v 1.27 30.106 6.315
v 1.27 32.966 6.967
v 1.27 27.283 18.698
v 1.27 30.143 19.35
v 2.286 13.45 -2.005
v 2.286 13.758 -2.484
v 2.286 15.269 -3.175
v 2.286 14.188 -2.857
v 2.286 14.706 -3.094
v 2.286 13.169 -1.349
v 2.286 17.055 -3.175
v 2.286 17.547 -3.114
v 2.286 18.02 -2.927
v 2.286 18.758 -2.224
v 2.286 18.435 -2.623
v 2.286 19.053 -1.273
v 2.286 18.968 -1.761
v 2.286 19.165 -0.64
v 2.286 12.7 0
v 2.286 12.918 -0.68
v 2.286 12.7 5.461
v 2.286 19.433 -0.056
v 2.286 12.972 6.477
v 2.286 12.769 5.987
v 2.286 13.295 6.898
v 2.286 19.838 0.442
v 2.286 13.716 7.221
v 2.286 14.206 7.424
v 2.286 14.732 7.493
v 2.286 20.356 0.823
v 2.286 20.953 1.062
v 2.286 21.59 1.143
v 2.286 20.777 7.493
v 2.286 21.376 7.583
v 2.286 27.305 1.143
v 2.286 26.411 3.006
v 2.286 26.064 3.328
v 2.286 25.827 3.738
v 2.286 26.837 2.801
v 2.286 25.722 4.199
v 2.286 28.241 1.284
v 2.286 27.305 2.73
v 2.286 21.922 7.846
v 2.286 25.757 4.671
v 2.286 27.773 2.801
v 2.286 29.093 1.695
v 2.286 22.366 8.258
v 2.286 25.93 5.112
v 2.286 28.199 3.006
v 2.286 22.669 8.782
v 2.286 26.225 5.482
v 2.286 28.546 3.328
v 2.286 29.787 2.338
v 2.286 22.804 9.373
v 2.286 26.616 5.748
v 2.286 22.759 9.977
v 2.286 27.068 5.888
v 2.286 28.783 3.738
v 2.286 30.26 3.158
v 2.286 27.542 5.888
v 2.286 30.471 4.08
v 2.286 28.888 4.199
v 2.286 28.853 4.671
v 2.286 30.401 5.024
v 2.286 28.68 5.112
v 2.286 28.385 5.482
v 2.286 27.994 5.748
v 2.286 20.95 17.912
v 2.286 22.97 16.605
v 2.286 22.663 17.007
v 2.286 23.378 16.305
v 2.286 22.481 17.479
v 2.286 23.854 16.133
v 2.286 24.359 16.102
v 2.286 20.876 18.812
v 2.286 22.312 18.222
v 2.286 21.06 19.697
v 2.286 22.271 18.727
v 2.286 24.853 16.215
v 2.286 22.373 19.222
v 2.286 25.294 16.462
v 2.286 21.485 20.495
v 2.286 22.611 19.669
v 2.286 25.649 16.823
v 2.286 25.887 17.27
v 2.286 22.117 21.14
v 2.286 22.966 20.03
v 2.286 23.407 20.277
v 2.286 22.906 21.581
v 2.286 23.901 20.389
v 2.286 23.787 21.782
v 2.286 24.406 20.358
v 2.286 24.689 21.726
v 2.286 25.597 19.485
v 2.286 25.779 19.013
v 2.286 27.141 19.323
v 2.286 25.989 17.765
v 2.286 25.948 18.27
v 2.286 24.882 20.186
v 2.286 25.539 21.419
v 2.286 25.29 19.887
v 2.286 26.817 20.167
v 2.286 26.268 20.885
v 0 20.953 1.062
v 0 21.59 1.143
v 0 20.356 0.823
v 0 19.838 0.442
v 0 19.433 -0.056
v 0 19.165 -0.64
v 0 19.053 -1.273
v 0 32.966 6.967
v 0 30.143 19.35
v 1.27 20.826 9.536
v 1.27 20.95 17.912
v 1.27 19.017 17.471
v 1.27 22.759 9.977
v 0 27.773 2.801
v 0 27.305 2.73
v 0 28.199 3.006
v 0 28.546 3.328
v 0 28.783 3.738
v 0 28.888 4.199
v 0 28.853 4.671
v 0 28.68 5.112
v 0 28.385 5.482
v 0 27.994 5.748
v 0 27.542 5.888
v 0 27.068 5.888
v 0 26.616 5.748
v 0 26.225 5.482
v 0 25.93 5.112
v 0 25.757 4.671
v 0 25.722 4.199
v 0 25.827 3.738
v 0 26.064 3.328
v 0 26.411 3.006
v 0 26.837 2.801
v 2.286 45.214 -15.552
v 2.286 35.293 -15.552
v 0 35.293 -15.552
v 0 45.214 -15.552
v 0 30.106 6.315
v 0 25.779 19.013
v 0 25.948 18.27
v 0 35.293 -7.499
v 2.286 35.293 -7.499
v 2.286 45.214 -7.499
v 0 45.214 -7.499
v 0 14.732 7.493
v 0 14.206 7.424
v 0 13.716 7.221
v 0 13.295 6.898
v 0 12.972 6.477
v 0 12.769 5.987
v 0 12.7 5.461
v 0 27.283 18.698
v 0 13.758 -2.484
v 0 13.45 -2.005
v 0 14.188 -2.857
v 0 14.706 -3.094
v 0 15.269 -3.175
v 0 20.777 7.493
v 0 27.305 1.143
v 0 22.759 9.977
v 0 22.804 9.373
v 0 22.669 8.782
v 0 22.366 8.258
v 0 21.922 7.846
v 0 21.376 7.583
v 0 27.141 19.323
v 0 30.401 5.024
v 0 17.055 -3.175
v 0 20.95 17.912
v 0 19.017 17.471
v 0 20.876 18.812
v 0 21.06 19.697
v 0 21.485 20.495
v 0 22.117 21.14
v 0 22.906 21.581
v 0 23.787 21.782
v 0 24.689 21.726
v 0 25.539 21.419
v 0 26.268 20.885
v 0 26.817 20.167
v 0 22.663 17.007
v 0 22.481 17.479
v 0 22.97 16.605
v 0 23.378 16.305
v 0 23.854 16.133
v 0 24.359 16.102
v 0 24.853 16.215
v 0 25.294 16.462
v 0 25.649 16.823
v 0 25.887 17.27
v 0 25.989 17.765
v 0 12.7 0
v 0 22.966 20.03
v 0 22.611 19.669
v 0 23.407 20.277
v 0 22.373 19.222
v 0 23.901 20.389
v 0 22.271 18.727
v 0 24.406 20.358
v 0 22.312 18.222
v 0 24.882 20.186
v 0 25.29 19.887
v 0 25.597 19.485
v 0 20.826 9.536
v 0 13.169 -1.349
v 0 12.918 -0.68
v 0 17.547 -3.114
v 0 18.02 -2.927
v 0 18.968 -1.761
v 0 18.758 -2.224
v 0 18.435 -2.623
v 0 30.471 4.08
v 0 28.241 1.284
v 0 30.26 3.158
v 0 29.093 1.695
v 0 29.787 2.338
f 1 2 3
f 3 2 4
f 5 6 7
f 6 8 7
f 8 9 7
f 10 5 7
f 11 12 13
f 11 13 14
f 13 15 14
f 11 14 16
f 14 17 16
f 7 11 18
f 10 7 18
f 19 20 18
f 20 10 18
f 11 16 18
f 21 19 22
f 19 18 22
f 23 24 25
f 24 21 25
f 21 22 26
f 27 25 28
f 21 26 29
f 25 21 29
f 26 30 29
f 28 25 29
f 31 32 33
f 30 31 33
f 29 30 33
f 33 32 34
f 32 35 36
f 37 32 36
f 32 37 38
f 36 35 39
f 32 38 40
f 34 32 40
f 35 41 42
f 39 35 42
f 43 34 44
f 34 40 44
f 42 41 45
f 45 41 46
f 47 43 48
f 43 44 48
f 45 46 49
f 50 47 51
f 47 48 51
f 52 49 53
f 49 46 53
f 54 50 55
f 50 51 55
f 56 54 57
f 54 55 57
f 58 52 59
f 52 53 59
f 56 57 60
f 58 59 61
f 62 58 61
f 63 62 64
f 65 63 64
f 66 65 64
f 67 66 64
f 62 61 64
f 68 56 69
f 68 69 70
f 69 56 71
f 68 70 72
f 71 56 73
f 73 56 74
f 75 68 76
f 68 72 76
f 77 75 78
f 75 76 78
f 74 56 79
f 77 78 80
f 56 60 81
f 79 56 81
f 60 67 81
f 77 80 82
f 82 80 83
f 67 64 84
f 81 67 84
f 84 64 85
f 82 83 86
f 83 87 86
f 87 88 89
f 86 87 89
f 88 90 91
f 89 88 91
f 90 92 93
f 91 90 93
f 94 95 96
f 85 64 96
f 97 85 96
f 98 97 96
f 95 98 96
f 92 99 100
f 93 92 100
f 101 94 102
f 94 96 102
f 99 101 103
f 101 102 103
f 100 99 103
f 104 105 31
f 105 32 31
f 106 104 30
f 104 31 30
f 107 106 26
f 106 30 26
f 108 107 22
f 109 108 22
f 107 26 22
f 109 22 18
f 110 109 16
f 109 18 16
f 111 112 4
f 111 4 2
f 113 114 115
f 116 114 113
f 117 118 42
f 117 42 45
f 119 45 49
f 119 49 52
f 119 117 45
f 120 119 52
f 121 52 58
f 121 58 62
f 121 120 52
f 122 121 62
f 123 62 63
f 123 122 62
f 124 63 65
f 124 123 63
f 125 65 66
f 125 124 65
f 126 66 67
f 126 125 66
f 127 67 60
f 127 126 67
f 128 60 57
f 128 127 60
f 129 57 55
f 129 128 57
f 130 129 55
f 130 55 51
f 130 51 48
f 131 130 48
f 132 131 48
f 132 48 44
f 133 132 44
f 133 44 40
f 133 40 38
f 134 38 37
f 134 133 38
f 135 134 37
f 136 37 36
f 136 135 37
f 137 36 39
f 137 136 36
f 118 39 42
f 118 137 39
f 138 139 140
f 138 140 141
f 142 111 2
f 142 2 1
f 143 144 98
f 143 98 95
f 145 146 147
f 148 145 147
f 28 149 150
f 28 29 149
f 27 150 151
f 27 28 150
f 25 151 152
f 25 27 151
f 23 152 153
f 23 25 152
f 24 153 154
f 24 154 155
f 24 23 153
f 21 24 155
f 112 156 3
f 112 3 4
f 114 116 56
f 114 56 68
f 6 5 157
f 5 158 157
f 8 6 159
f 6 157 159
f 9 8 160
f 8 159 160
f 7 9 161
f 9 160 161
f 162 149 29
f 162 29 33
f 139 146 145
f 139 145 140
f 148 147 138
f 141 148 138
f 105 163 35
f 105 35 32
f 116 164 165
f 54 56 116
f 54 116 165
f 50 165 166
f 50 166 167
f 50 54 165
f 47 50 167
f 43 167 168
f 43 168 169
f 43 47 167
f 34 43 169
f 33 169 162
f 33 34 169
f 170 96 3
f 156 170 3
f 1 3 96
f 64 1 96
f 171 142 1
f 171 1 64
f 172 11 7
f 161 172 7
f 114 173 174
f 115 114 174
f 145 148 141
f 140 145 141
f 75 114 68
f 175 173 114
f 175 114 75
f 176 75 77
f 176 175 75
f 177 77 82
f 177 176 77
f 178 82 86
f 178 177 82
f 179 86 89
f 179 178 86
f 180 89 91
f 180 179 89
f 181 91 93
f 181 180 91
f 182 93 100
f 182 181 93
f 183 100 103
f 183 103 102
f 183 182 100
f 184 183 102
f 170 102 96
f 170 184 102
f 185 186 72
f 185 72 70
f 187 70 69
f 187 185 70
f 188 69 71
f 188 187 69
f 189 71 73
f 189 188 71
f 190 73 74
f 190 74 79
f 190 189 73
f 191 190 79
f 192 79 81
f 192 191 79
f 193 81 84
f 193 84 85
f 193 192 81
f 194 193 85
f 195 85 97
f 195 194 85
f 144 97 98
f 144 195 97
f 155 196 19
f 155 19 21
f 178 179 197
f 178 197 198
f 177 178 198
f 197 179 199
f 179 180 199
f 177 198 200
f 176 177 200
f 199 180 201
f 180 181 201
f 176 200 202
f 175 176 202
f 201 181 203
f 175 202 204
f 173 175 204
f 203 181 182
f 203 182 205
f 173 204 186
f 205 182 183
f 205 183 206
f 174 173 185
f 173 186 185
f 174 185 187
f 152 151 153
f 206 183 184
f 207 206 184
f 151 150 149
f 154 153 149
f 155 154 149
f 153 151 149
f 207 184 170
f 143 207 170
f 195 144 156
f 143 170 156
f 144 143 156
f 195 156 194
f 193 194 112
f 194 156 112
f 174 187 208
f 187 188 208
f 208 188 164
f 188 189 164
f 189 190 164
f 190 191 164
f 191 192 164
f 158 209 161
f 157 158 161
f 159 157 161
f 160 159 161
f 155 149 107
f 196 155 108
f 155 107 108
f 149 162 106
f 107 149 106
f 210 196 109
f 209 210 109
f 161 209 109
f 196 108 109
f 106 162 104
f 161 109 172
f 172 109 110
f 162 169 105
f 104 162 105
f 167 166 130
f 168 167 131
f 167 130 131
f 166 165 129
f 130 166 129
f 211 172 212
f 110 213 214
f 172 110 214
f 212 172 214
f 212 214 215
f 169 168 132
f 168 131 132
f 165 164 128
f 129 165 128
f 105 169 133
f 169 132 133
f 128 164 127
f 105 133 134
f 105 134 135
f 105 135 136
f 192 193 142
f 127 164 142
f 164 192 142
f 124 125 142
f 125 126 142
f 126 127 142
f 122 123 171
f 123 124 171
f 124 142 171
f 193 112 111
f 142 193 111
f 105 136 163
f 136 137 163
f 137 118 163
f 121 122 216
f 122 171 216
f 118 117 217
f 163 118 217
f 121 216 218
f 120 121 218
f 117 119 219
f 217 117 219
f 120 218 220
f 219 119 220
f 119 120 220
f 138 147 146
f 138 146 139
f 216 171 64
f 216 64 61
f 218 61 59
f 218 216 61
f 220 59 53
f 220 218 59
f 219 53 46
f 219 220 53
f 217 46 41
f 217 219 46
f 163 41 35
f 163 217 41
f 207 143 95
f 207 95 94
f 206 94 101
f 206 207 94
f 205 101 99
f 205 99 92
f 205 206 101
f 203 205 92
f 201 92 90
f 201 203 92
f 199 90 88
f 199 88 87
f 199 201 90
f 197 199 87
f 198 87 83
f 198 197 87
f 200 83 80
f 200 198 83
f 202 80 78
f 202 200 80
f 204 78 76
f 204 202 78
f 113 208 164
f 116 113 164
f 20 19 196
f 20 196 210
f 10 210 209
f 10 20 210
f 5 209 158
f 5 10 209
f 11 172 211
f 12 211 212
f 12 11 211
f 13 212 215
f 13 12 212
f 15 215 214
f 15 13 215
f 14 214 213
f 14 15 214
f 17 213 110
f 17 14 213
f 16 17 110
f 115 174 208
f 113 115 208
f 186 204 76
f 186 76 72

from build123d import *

# Parameters (mm, degrees)
SKETCH2_R           = 1.5875
BOSS_EXTRUDE1_DEPTH = 2.286
FILLET1_R           = 2.032
FILLET3_R           = 2.54
CUT_EXTRUDE2_DEPTH  = 38.538801483
FILLET4_R           = 2
FILLET5_R           = 2
BOSS_EXTRUDE2_DEPTH = 1.27
SKETCH6_W           = 8.053565913
SKETCH6_H           = 9.921059459
BOSS_EXTRUDE3_DEPTH = 2.286


with BuildPart() as part:
    # Sketch2 → Boss-Extrude1 (new body)
    with BuildSketch(Plane(origin=(0, 0, 0), x_dir=(0, 0, -1), z_dir=(1, 0, 0))):
        with BuildLine():
            Line((-19.322996014, 27.140905532), (-5.0236712, 30.400586076))
            ThreePointArc((-5.0236712, 30.400586076), (-2.338085994, 29.787048656), (-1.143, 27.305))
            Line((-1.143, 27.305), (-1.143, 19.05))
            Line((-1.143, 19.05), (3.175, 19.05))
            Line((3.175, 19.05), (3.175, 15.875))
            Line((3.175, 15.875), (3.175, 12.7))
            Line((3.175, 12.7), (-7.493, 12.7))
            Line((-7.493, 12.7), (-7.493, 23.324774364))
            Line((-7.493, 23.324774364), (-17.911653613, 20.949733379))
            ThreePointArc((-17.911653613, 20.949733379), (-21.71291089, 23.339648256), (-19.322996014, 27.140905532))
        make_face()
        with Locations((-4.318, 27.305)):
            Circle(SKETCH2_R, mode=Mode.SUBTRACT)
        with BuildLine():
            Line((-18.222148942, 22.311791253), (-17.479208283, 22.481152341))
            ThreePointArc((-17.479208283, 22.481152341), (-16.140855953, 24.609856416), (-18.269560028, 25.948208747))
            Line((-18.269560028, 25.948208747), (-19.012500686, 25.778847659))
            ThreePointArc((-19.012500686, 25.778847659), (-20.350853017, 23.650143584), (-18.222148942, 22.311791253))
        make_face(mode=Mode.SUBTRACT)
    extrude(amount=BOSS_EXTRUDE1_DEPTH)

    # Fillet1
    fillet1_edges = [part.edges().sort_by_distance(p)[0] for p in [
        (1.143, 12.7, 7.493),
        (1.143, 23.324774364, 7.493),
    ]]
    fillet(fillet1_edges, radius=FILLET1_R)

    # Fillet3
    fillet3_edges = [part.edges().sort_by_distance(p)[0] for p in [
        (1.143, 19.05, 1.143),
    ]]
    fillet(fillet3_edges, radius=FILLET3_R)

    # Sketch4 → Cut-Extrude2 (cut, through all)
    with BuildSketch(Plane(origin=(2.286, 0, 0), x_dir=(0, 0, -1), z_dir=(1, 0, 0))):
        with BuildLine():
            Line((3.175, 14.045810734), (3.175, 12.7))
            Line((3.175, 12.7), (0, 12.7))
            ThreePointArc((0, 12.7), (1.625713644, 13.282752779), (3.175, 14.045810734))
        make_face()
    extrude(amount=-CUT_EXTRUDE2_DEPTH, mode=Mode.SUBTRACT)

    # Fillet4
    fillet4_edges = [part.edges().sort_by_distance(p)[0] for p in [
        (1.143, 14.045810734, -3.175),
    ]]
    fillet(fillet4_edges, radius=FILLET4_R)

    # Fillet5
    fillet5_edges = [part.edges().sort_by_distance(p)[0] for p in [
        (1.143, 19.05, -3.175),
    ]]
    fillet(fillet5_edges, radius=FILLET5_R)

    # Sketch5 → Boss-Extrude2 (add)
    with BuildSketch(Plane.ZY):
        Polygon((6.315327521, 30.106139518), (18.697671827, 27.283454717), (19.349637641, 30.143449985), (6.967293335, 32.966134786), align=None)
        Polygon((9.976629568, 22.758605045), (17.911653613, 20.949733379), (17.470982606, 19.01663049), (9.53595856, 20.825502156), align=None)
    extrude(amount=-BOSS_EXTRUDE2_DEPTH)


with BuildPart() as body_2:
    # Sketch6 → Boss-Extrude3 (new body)
    with BuildSketch(Plane(origin=(2.286, 0, 0), x_dir=(0, 0, -1), z_dir=(1, 0, 0))):
        with Locations((11.525562457, 40.25328062)):
            Rectangle(SKETCH6_W, SKETCH6_H)
    extrude(amount=-BOSS_EXTRUDE3_DEPTH)


solid = Compound([part.part, body_2.part])
